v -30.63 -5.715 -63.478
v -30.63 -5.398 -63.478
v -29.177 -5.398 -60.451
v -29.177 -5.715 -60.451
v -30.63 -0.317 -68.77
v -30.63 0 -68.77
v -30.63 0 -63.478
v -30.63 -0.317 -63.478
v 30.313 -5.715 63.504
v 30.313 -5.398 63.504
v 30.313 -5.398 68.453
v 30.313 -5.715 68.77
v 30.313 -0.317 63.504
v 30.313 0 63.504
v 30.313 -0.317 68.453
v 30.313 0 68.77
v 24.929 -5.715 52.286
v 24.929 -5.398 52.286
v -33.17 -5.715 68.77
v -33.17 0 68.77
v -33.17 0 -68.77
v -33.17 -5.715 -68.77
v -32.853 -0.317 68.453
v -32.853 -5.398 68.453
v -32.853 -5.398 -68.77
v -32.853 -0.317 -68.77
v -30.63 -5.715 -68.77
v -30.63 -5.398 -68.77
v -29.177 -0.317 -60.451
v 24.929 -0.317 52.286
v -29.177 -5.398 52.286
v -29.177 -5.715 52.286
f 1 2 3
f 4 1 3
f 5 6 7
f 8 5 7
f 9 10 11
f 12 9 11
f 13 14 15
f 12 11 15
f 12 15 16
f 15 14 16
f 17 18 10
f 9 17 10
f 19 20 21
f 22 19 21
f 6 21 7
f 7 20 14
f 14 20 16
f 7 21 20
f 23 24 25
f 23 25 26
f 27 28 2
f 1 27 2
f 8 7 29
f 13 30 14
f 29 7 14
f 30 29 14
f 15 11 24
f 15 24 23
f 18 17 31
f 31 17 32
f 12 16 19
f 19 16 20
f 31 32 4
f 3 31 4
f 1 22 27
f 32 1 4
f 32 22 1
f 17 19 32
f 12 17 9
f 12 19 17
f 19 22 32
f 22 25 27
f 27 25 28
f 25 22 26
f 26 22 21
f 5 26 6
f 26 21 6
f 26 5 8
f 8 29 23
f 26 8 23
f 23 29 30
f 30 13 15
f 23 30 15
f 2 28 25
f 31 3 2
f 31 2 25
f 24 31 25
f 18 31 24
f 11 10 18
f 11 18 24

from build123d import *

# Parameters (mm, degrees)
F1_DEPTH = 5.715
F3_DEPTH = 5.3975
F4_W     = 5.08
F4_H     = 137.2235
F5_DEPTH = 63.165533


with BuildPart() as f1:
    # F0 (on Front) → F1 (new body)
    with BuildSketch(Plane.XZ):
        Polygon((30.312766, 68.7705), (-33.170266, 68.7705), (-33.170266, -68.7705), (-30.630266, -68.7705), (-30.630266, -63.478089), (30.312766, 63.50442), align=None)
    extrude(amount=F1_DEPTH)

    # F2 (on face) → F3 (cut)
    with BuildSketch(Plane.XZ.offset(5.715)):
        Polygon((24.928634, 52.2859), (-29.177386, 52.2859), (-29.177386, -60.45083), align=None)
    extrude(amount=-F3_DEPTH, mode=Mode.SUBTRACT)

    # F4 (on face) → F5 (cut)
    with BuildSketch(Plane.YZ.offset(30.312766)):
        with Locations((-2.8575, -0.15875)):
            Rectangle(F4_W, F4_H)
    extrude(amount=-F5_DEPTH, mode=Mode.SUBTRACT)


solid = f1.part
